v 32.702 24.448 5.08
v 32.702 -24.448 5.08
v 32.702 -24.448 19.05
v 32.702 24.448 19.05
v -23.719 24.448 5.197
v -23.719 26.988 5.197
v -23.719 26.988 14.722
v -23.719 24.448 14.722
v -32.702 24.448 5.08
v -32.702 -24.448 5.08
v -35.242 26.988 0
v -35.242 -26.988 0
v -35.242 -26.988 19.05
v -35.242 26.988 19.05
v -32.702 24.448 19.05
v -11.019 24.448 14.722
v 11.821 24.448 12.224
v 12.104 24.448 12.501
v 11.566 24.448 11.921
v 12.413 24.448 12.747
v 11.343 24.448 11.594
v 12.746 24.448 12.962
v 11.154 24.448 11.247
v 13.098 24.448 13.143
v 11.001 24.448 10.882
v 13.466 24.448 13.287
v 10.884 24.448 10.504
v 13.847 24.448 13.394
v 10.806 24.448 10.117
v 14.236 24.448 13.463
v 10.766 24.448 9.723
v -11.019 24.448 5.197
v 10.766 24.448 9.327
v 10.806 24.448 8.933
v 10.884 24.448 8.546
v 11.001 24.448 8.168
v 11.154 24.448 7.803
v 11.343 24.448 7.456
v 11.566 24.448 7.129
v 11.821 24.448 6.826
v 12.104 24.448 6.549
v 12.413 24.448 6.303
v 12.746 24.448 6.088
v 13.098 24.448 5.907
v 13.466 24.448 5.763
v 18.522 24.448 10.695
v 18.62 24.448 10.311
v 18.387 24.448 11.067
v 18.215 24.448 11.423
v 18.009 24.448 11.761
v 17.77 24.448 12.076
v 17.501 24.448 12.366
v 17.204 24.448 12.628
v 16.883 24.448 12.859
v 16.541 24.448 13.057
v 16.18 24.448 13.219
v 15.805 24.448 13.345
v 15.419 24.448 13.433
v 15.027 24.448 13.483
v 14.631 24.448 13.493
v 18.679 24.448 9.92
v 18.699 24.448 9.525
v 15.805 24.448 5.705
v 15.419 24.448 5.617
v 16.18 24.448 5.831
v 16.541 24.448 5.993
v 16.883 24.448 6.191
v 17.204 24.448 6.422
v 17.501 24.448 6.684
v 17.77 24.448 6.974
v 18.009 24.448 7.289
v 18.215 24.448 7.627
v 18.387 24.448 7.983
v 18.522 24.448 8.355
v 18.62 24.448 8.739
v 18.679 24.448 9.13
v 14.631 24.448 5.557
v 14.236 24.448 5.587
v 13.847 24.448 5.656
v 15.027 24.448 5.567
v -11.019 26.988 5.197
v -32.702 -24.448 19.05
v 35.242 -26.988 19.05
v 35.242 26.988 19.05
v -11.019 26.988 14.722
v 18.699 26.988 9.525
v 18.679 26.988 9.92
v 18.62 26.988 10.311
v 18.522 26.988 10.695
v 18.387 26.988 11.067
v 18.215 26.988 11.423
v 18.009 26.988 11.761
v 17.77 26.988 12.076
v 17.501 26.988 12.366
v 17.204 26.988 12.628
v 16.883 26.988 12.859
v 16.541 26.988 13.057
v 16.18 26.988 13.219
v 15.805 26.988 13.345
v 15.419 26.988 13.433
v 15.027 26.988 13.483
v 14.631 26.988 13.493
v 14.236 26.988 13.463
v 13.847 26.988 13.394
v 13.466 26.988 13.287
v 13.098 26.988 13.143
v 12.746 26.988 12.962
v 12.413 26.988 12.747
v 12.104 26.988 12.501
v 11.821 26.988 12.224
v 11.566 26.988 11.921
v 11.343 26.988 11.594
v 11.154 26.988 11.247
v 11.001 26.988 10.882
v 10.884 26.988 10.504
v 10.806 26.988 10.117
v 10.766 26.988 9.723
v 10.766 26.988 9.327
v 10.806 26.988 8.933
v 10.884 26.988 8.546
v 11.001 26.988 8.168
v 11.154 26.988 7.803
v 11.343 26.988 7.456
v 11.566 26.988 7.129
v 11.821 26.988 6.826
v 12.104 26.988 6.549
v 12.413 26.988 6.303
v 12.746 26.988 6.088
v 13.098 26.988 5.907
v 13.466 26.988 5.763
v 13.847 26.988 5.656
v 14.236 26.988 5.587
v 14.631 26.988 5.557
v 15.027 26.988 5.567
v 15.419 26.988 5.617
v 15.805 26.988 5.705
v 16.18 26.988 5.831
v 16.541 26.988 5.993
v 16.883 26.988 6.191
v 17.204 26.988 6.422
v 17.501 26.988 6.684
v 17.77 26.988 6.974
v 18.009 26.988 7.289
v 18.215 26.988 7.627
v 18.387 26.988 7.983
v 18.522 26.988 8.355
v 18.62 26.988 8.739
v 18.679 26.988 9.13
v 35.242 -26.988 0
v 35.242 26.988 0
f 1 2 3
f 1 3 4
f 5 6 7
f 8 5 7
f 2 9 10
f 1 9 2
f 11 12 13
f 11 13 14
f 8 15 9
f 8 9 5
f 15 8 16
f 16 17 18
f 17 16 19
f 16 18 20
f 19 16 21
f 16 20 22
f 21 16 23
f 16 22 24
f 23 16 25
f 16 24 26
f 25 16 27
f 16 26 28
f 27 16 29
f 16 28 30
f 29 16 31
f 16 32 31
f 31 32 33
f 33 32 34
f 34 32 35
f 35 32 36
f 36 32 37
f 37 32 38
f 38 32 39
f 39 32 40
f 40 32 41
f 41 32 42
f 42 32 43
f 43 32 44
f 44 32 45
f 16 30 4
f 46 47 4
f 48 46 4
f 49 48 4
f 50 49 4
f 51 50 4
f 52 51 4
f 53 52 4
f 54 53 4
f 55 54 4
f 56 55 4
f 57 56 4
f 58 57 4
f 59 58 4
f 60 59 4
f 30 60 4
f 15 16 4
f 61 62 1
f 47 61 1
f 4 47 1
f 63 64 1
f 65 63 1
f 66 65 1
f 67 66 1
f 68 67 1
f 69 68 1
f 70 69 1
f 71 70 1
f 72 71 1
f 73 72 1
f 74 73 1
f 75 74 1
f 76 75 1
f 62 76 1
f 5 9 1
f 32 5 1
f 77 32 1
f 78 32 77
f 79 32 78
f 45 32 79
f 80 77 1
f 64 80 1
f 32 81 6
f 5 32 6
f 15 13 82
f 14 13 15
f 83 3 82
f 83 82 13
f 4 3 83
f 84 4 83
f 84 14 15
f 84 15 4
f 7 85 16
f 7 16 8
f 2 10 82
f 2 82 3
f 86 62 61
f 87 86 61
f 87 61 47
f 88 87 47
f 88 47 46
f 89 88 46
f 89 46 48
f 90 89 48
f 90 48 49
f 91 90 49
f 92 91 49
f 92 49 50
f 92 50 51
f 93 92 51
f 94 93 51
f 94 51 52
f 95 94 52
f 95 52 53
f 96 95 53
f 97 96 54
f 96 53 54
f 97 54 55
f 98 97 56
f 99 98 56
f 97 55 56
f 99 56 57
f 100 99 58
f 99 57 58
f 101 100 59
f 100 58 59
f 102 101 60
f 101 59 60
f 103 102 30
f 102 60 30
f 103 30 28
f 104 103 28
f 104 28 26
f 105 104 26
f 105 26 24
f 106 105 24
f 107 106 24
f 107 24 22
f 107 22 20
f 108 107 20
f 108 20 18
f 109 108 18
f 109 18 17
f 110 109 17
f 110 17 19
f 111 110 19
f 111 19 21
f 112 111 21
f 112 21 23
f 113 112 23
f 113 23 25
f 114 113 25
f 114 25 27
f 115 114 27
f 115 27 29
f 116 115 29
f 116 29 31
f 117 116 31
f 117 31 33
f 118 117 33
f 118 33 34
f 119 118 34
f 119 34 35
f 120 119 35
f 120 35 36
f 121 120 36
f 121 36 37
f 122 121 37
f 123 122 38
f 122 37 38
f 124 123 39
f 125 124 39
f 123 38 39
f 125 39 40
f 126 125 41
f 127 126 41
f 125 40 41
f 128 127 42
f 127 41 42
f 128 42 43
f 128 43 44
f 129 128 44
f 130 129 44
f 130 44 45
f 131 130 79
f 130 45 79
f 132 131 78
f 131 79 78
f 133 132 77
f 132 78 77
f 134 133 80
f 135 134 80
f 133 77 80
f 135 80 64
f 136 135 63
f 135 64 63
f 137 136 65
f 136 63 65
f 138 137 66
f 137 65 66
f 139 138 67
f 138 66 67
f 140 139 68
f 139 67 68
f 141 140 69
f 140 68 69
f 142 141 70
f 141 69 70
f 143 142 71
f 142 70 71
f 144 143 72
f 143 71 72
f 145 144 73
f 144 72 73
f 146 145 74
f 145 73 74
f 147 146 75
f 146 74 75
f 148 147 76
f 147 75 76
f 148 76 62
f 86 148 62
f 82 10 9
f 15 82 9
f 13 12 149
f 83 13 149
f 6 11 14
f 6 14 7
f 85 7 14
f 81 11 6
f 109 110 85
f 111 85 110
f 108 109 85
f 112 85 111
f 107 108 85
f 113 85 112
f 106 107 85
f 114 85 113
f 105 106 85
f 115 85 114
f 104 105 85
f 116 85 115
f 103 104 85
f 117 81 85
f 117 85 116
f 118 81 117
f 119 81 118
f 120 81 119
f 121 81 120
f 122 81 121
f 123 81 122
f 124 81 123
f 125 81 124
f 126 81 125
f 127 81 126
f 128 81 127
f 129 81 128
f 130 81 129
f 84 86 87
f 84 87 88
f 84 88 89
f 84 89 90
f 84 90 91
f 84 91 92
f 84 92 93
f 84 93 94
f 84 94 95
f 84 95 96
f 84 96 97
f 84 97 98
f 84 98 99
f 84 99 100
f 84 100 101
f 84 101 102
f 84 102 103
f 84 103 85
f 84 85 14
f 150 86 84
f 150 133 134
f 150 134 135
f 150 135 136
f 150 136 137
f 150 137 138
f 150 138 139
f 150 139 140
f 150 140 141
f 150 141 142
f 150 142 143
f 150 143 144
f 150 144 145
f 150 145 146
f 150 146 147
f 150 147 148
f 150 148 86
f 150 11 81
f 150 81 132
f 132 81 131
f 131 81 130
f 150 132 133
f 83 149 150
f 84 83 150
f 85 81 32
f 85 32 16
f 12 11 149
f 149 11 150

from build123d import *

# Parameters (mm, degrees)
F0_W     = 70.485
F0_H     = 53.975
F1_DEPTH = 19.05
F2_T     = -2.54
F3_W     = 12.7
F3_H     = 9.525
F4_DEPTH = 3.302
F6_D     = 7.9375
F6_DEPTH = 12.7
F6_TIP   = 2.3846655818
F7_DEPTH = 2.54


with BuildPart() as f1:
    # F0 (on Top) → F1 (new body)
    with BuildSketch(Plane.XY):
        Rectangle(F0_W, F0_H)
    extrude(amount=F1_DEPTH)

    # F2
    f2_openings = [f1.faces().sort_by_distance(p)[0] for p in [
        (0, 0, 19.05),
    ]]
    offset(amount=F2_T, openings=f2_openings)

    # F3 (on face) → F4 (cut)
    with BuildSketch(Plane(origin=(0, 26.9875, 0), x_dir=(-1, 0, 0), z_dir=(0, 1, 0))):
        with Locations((17.3686798662, 9.959281401)):
            Rectangle(F3_W, F3_H)
    extrude(amount=-F4_DEPTH, mode=Mode.SUBTRACT)

    # F6
    with Locations(Plane(origin=(0, 26.9875, 0), x_dir=(-1, 0, 0), z_dir=(0, 1, 0))):
        with Locations((-14.7299328819, 9.525)):
            Hole(F6_D / 2, depth=F6_DEPTH)
            with Locations((0, 0, -(F6_DEPTH + F6_TIP / 2))):  # 118° drill point
                Cone(0, F6_D / 2, F6_TIP, mode=Mode.SUBTRACT)

    # F7 (add): a face of the model
    f7_faces = [f1.faces().sort_by_distance(p)[0] for p in [
        (0, 0, 2.54),
    ]]
    extrude(f7_faces, amount=F7_DEPTH)


solid = f1.part
